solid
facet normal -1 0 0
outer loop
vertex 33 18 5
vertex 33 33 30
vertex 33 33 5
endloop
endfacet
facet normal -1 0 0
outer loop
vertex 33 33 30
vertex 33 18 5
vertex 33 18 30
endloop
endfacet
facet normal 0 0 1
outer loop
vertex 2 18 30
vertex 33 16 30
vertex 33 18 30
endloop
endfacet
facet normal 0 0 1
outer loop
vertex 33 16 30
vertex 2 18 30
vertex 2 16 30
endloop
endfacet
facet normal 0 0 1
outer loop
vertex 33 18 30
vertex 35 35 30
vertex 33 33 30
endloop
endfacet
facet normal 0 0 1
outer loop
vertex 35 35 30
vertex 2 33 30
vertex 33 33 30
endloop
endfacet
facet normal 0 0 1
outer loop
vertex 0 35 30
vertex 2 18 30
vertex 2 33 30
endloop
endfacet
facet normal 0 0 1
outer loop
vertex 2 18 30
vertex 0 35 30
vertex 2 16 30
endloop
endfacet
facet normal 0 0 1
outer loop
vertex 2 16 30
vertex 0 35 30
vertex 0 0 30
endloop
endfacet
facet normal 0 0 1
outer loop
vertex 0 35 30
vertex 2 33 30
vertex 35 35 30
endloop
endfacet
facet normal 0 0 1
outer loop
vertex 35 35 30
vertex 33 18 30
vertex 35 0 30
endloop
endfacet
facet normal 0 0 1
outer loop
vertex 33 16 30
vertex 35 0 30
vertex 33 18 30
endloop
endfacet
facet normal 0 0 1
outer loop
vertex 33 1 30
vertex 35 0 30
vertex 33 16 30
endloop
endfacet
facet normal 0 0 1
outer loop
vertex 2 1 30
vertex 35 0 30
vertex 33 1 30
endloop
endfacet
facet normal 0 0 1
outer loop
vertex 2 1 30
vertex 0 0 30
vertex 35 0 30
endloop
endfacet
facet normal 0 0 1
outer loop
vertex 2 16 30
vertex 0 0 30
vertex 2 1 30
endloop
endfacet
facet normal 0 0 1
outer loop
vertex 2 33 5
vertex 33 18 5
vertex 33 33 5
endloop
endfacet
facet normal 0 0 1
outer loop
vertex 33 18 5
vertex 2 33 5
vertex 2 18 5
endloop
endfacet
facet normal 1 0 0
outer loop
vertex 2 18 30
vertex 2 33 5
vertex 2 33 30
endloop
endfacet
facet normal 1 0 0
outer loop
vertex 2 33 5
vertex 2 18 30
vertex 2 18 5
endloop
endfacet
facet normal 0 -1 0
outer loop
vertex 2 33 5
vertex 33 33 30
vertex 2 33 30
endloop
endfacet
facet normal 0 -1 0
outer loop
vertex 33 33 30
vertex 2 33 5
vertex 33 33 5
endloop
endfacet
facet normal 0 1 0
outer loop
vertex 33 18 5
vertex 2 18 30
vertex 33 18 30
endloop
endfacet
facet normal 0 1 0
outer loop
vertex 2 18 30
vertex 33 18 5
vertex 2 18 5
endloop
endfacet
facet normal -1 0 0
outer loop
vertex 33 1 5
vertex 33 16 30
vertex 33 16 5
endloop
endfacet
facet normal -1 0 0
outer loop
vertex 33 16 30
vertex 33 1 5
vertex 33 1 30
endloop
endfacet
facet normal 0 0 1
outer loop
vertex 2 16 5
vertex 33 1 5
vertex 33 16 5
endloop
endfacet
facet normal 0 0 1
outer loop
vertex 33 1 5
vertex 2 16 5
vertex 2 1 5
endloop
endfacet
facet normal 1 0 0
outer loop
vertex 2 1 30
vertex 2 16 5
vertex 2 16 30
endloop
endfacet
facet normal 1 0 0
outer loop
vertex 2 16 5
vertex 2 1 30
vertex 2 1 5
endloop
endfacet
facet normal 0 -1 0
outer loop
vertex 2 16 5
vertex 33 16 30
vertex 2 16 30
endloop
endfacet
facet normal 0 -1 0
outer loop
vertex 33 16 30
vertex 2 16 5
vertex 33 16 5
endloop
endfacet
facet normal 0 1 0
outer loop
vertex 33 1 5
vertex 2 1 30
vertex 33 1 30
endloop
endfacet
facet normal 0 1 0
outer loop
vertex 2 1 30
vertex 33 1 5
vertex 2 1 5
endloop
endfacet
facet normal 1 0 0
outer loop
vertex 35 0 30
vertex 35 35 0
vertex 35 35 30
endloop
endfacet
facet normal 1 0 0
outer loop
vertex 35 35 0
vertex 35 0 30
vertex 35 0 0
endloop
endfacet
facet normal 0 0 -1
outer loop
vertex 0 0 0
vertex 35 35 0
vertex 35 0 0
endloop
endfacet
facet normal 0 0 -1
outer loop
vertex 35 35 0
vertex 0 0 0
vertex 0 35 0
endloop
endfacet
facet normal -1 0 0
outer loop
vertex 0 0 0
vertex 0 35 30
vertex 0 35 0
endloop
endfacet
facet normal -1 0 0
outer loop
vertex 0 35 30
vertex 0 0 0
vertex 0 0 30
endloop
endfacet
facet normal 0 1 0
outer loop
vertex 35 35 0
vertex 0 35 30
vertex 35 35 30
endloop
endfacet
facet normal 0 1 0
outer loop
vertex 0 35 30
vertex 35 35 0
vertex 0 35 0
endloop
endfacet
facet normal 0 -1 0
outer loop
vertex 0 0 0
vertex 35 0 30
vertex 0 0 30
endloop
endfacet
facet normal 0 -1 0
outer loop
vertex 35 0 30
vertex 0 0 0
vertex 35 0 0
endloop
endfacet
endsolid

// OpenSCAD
difference() {
  translate([17.5000000000, 17.5000000000, 15.0000000000]) {
    scale([35.0000000000, 35.0000000000, 30.0000000000]) {
      translate([-0.5000000000, -0.5000000000, -0.5000000000]) {
        cube([1, 1, 1]);
      }
    }
  }
  union() {
    translate([17.5000000000, 25.5000000000, 17.5000000000]) {
      scale([31.0000000000, 15.0000000000, 25.0000000000]) {
        translate([-0.5000000000, -0.5000000000, -0.5000000000]) {
          cube([1, 1, 1]);
        }
      }
    }
    translate([17.5000000000, 8.5000000000, 17.5000000000]) {
      scale([31.0000000000, 15.0000000000, 25.0000000000]) {
        translate([-0.5000000000, -0.5000000000, -0.5000000000]) {
          cube([1, 1, 1]);
        }
      }
    }
  }
}
